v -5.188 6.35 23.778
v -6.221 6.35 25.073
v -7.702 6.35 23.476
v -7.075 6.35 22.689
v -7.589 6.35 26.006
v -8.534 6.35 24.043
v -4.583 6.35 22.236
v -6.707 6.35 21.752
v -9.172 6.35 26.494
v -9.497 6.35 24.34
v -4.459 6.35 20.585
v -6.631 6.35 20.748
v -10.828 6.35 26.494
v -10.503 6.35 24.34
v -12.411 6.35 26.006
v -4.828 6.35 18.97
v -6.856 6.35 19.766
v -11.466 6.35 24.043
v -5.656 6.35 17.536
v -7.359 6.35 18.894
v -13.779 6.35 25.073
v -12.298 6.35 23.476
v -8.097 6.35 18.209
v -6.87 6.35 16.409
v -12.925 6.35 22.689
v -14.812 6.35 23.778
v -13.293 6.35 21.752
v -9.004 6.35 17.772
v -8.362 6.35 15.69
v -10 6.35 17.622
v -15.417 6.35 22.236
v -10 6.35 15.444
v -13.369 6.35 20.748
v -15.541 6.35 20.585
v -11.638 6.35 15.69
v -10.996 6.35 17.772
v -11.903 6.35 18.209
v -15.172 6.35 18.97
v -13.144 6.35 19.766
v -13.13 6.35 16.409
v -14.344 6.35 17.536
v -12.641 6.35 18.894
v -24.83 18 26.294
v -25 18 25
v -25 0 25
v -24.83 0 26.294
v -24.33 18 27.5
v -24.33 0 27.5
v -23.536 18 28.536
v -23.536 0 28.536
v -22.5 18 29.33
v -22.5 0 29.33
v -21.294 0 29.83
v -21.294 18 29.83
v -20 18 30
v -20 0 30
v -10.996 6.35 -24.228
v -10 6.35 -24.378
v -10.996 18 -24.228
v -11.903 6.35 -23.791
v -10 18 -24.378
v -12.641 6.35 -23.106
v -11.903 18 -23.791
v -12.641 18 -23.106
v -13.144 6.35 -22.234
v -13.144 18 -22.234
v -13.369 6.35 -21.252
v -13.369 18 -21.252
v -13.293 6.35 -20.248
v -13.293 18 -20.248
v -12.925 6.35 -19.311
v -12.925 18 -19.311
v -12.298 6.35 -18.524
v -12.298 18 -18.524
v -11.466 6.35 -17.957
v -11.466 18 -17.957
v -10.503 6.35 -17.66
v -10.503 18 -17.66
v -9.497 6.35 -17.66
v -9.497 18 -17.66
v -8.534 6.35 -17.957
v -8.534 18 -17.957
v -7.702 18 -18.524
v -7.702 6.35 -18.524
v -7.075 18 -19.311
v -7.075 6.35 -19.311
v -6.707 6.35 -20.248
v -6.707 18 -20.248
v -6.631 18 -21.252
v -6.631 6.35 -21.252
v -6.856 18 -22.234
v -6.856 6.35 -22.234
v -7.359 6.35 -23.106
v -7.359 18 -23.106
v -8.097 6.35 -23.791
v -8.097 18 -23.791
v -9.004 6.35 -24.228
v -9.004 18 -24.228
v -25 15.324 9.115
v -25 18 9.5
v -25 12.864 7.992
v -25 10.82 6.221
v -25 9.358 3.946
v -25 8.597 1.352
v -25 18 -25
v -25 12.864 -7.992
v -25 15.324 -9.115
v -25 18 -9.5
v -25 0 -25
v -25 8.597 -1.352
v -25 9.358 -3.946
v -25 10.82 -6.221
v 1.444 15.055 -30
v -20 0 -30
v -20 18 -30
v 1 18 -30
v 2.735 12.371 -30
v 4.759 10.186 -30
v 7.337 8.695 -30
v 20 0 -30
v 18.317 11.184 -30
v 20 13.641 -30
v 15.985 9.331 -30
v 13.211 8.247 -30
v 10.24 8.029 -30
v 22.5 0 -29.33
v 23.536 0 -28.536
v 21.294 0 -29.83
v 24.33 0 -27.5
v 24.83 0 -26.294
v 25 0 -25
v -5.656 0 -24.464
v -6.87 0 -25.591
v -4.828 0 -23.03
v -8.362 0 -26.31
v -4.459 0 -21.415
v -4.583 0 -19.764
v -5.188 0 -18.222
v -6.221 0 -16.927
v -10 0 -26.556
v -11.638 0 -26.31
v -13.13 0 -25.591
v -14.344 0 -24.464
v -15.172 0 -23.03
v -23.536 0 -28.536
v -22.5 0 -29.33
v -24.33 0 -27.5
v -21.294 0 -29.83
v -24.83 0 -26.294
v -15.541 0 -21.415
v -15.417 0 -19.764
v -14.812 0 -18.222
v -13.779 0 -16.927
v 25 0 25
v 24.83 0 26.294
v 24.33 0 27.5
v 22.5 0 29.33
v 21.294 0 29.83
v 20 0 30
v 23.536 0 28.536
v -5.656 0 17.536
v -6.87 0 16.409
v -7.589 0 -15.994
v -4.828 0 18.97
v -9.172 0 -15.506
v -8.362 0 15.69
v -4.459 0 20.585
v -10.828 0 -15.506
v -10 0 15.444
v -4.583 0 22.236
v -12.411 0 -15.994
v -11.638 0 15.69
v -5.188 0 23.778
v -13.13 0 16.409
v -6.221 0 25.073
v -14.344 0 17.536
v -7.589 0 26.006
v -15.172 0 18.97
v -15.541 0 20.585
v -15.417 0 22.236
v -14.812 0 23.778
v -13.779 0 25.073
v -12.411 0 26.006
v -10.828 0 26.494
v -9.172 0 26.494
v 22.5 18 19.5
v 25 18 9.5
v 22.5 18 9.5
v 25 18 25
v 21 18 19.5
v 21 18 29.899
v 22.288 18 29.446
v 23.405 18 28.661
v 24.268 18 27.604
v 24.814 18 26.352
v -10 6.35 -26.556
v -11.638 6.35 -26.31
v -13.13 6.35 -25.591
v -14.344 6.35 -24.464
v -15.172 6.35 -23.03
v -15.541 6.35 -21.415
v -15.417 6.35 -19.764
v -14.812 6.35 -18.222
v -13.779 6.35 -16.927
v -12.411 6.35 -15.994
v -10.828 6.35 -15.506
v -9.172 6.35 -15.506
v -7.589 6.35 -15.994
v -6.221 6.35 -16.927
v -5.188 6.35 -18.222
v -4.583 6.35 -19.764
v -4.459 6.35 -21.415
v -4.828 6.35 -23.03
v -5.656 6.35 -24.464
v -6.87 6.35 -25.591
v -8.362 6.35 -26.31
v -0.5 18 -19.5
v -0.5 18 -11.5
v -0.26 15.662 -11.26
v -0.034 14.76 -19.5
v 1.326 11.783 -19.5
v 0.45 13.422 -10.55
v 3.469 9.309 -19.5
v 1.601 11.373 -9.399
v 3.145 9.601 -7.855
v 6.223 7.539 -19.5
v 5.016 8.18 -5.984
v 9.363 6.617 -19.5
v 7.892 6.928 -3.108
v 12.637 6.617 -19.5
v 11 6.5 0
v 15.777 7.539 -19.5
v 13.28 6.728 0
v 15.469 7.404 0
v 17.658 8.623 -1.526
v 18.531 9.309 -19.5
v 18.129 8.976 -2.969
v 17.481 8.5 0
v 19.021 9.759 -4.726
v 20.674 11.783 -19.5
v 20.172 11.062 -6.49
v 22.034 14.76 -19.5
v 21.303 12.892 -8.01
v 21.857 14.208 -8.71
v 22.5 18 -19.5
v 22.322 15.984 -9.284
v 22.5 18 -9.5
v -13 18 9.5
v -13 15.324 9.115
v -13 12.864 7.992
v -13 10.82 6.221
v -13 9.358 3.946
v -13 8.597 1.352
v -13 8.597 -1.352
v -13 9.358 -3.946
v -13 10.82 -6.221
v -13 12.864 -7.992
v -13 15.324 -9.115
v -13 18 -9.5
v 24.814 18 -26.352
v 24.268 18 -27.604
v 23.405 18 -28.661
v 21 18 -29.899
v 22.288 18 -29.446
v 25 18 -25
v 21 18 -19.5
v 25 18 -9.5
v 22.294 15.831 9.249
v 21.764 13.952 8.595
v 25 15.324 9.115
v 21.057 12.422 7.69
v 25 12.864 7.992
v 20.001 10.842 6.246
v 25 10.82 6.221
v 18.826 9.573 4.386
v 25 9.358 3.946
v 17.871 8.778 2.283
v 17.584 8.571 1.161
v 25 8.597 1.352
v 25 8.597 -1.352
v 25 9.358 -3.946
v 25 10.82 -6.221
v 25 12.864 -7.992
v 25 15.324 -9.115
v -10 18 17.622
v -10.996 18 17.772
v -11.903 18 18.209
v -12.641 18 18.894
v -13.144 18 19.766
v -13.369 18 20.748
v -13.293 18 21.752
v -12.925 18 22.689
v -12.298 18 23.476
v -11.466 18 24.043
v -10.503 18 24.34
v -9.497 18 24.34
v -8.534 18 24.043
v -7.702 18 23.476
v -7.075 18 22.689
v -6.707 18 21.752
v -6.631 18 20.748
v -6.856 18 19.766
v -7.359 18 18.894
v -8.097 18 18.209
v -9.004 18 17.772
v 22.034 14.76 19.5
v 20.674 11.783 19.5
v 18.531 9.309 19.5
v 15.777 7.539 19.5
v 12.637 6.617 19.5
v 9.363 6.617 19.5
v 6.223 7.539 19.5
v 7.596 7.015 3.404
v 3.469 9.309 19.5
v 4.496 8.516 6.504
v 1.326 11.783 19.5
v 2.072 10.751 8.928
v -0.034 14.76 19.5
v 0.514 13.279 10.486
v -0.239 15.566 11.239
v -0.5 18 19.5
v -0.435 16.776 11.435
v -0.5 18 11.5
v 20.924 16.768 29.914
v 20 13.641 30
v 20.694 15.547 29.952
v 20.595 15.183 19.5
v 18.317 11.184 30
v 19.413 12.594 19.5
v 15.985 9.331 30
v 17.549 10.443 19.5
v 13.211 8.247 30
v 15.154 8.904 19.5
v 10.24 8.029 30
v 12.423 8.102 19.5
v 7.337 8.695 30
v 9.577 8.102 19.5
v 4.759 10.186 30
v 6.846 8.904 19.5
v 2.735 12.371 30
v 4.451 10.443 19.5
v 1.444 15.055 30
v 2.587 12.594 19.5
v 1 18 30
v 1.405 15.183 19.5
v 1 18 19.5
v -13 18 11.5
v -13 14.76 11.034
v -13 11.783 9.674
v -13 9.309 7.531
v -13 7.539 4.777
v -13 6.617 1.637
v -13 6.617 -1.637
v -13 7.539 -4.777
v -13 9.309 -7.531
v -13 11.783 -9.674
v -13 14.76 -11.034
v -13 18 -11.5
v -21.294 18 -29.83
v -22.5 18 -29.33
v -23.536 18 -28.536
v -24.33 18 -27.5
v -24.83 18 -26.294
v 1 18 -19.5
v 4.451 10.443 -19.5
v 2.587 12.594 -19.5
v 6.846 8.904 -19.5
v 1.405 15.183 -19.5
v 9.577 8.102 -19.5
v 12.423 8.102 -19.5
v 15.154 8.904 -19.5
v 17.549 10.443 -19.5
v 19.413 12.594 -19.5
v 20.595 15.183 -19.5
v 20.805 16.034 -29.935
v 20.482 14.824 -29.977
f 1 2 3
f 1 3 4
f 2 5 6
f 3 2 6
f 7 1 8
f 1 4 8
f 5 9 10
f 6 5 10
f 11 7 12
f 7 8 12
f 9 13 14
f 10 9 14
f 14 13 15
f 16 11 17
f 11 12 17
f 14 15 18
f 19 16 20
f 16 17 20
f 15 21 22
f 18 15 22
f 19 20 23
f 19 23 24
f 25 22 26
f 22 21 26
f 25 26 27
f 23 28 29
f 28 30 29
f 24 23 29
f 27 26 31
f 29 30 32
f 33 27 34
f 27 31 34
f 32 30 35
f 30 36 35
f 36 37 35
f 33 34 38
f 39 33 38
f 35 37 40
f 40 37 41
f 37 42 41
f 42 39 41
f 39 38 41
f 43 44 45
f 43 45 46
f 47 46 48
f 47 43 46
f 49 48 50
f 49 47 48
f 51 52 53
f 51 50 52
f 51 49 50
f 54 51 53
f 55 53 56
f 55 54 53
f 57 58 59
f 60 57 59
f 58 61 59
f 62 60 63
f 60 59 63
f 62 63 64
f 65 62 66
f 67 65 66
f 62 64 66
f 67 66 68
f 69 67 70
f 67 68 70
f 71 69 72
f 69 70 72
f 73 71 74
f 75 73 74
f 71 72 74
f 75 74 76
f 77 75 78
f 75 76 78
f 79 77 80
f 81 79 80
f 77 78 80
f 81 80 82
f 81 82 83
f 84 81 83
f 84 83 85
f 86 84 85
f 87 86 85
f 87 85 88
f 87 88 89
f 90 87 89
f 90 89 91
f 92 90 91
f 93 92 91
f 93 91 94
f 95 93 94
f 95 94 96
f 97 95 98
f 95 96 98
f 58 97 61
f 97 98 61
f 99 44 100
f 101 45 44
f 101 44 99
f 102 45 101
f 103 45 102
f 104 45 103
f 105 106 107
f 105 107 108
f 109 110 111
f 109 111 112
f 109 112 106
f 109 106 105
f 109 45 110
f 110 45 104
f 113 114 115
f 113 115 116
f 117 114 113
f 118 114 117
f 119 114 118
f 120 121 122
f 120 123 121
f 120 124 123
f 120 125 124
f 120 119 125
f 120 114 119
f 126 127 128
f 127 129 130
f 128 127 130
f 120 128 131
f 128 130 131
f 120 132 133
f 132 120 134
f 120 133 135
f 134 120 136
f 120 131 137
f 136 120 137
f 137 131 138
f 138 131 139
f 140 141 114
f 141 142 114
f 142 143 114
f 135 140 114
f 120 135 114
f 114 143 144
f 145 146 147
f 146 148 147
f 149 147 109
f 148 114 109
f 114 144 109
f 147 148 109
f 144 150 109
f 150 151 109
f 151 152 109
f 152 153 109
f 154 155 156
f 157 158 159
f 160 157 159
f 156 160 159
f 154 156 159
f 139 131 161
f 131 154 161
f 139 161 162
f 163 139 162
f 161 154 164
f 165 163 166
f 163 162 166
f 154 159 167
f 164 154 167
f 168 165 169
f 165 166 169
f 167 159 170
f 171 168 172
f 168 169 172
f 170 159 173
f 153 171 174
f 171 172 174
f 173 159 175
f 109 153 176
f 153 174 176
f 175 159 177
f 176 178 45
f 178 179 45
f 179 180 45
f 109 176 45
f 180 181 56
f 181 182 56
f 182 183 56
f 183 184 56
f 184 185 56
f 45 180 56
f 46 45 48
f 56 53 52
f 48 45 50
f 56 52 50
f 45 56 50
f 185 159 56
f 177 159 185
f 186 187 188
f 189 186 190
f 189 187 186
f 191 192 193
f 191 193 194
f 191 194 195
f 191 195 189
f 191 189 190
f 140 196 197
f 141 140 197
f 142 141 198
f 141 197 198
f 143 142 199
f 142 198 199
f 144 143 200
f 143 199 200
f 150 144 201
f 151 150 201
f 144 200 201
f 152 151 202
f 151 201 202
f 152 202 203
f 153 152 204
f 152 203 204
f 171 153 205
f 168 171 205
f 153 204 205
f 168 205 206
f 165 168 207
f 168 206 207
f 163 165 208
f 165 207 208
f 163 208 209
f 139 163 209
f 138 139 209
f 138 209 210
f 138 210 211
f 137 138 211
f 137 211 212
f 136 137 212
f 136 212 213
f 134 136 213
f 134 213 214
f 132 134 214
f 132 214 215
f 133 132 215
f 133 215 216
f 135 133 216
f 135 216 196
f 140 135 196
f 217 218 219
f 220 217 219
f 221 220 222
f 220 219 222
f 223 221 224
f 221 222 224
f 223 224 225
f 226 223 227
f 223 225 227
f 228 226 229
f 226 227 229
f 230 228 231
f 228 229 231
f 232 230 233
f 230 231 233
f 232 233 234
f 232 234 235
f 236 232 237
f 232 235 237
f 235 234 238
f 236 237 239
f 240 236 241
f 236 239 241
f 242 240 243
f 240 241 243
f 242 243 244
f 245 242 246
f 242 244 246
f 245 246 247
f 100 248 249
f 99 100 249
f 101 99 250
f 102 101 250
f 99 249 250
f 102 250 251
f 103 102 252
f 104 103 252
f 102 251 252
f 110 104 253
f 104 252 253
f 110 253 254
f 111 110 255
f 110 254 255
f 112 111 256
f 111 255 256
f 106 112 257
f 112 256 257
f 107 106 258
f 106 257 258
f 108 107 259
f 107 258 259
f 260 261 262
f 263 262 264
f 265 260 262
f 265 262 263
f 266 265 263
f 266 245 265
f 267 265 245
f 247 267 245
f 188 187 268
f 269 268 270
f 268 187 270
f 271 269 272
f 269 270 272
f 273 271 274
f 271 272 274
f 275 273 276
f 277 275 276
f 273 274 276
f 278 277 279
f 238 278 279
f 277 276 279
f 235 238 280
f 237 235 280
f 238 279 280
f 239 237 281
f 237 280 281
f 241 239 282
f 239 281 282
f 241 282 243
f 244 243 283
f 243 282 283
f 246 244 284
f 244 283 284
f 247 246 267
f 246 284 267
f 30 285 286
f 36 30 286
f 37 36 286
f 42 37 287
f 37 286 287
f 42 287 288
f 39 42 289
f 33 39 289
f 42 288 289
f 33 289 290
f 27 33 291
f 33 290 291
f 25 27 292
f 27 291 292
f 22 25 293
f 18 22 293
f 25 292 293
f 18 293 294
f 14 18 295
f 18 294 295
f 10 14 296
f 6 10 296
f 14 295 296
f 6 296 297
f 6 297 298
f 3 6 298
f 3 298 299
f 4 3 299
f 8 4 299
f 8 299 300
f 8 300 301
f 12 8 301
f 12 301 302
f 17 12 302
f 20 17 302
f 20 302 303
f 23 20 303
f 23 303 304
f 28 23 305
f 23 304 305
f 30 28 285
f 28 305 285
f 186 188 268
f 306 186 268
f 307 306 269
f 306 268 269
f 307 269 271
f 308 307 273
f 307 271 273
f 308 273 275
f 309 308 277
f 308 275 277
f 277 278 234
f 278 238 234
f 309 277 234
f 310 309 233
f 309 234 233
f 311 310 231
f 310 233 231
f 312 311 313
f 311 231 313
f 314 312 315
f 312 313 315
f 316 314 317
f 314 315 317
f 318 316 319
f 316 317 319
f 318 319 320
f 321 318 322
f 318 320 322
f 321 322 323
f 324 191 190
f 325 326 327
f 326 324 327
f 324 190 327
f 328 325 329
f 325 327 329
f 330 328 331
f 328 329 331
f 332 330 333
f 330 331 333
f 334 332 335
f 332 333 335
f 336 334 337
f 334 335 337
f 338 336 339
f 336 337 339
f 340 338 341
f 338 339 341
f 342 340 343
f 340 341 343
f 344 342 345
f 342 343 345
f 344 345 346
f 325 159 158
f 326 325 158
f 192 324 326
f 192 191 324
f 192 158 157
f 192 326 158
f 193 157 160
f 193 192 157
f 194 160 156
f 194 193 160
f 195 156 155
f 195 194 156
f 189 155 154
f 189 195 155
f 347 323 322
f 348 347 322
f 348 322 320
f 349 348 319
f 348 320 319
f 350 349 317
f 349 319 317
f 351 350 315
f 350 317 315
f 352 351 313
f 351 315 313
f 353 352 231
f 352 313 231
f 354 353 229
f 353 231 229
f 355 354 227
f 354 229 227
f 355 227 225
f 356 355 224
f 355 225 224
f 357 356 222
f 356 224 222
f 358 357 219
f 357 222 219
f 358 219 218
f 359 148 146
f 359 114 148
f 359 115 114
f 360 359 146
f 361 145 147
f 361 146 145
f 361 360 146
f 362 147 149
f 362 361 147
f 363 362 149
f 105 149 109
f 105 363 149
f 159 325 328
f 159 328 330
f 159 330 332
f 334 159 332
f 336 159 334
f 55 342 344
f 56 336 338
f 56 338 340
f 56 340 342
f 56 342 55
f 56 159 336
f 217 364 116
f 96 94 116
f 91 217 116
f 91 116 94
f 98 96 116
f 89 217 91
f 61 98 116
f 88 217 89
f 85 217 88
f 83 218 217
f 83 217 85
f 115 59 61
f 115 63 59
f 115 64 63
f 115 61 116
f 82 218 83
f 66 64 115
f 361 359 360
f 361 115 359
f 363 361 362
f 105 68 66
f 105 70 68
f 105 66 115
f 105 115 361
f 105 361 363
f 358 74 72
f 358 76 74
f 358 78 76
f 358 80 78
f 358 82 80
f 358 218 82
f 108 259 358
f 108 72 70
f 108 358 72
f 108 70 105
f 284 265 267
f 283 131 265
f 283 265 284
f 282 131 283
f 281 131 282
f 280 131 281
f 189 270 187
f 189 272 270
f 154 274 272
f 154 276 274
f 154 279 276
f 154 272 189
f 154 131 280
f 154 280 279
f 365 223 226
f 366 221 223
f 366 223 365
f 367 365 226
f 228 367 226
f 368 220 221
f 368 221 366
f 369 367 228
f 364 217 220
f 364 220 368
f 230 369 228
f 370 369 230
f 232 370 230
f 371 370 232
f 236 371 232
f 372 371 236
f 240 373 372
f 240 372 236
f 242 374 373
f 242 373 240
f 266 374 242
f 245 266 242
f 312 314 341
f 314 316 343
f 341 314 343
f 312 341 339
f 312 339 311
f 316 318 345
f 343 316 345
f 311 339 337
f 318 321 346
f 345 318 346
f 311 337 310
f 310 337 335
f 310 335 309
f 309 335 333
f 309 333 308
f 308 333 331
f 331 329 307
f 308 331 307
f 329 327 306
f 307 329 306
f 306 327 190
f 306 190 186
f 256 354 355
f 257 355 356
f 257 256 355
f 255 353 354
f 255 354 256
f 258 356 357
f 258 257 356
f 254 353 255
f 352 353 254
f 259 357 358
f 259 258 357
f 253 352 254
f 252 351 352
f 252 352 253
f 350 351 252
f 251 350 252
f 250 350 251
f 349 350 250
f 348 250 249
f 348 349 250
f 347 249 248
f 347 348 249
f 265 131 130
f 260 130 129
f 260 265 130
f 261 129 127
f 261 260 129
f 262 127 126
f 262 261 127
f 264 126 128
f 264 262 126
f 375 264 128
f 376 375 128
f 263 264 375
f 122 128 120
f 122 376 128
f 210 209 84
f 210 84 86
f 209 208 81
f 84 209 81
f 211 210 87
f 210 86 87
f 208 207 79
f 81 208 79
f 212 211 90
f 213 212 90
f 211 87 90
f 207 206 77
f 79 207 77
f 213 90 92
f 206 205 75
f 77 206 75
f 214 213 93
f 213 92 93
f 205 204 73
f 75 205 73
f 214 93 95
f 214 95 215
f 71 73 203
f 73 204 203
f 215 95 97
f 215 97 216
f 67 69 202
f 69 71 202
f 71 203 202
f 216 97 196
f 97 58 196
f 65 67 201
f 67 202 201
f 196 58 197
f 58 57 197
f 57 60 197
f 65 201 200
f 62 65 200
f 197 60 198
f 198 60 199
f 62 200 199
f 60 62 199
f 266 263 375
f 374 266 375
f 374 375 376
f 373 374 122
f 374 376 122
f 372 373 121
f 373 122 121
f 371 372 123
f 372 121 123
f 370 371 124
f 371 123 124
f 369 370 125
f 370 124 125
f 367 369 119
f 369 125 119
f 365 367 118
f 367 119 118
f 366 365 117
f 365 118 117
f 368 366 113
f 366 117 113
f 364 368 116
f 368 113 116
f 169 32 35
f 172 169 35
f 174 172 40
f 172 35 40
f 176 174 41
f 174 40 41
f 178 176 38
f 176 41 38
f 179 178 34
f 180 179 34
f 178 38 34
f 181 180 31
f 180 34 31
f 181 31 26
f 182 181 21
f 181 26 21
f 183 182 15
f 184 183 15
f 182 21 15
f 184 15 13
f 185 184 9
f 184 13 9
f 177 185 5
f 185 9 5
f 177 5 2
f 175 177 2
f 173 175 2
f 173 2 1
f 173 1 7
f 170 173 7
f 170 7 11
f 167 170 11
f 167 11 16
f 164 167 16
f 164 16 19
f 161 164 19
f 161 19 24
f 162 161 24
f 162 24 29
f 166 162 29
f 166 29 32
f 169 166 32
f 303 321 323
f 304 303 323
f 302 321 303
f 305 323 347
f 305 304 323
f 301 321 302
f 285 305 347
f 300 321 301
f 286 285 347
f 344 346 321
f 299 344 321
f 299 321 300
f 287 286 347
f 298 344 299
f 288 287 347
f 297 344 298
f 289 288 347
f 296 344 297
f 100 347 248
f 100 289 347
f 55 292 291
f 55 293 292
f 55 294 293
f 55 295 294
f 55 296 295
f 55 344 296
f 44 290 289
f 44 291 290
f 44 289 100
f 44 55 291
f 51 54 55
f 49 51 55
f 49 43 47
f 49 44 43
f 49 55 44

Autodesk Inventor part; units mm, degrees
ref_plane "XZ Plane" through (0, 0, 0) normal (0, 1, 0) x (-1, 0, 0)
ref_plane "XY Plane" through (0, 0, 0) normal (0, 0, 1) x (1, 0, 0)
sketch "Sketch1" plane through (0, 0, 0) normal (0, 1, 0) x (-1, 0, 0)
  line L0 (-25, 30) -> (25, 30)
  line L1 (25, 30) -> (25, -30)
  line L2 (25, -30) -> (-25, -30)
  line L3 (-25, -30) -> (-25, 30)
  line L4 (-25, 30) -> (25, -30) construction
  line L5 (25, 30) -> (-25, -30) construction
  point P0 (0, 0)
  dimension "d0" = 50
  dimension "d1" = 60
extrude "Extrusion1" add sketch "Sketch1" along normal blind 18
sketch "Sketch2" plane through (25, 0, 30) normal (1, 0, 0) x (0, 0, -1)
  line L0 (60, 18) -> (0, 18) projected
  circle A0 centre (30, 18) radius 9.5
  point P0 (30, 0)
  point P1 (20.5, 18)
  point P2 (39.5, 18)
  dimension "d4" = 19
extrude "Extrusion2" cut sketch "Sketch2" against normal through all contours A0 L0 picked at (28.8771, 15.0391)
sketch "Sketch3" plane through (25, 0, -30) normal (0, 0, -1) x (-1, 0, 0)
  line L0 (0, 18) -> (50, 18) projected
  circle A0 centre (14, 18) radius 10
  point P0 (25, 0)
  point P1 (24, 18)
  point P2 (4, 18)
  dimension "d7" = 20
  dimension "d8" = 14
extrude "Extrusion3" cut sketch "Sketch3" against normal through all contours L0 A0 picked at (12.1065, 15.2567)
sketch "Sketch4" plane through (0, 0, 0) normal (0, 0, 1) x (1, 0, 0)
  arc A0 (1, 18) -> (21, 18) centre (11, 18) ccw projected
  circle A1 centre (11, 18) radius 11.5
  point P0 (0, 0)
  dimension "d11" = 23
extrude "Extrusion4" cut sketch "Sketch4" along normal mid plane 39
ref_plane "Work Plane2" through (11, 18, -30) normal (1, 0, 0) x (0, 1, 0)
sketch "Sketch5" plane through (11, 18, -30) normal (1, 0, 0) x (0, 1, 0)
  arc A0 (0, 39.5) -> (0, 20.5) centre (0, 30) ccw projected
  circle A1 centre (0, 30) radius 11.5
  point P0 (-18, 30)
  dimension "d14" = 23
extrude "Extrusion5" cut sketch "Sketch5" against normal blind 24
sketch "Sketch7" plane through (0, 0, 0) normal (0, -1, 0) x (1, 0, 0)
  line L0 (25, -30) -> (-25, -30) projected
  line L1 (-25, 30) -> (25, 30) projected
  line L2 (-25, -30) -> (-25, 30) projected
  point P0 (0, 0)
  point P1 (-10, -21)
  point P2 (-10, 21)
  dimension "d28" = 9
  dimension "d29" = 9
  dimension "d30" = 15
hole "Hole2" at (-10, 0, -21) at (-10, 0, 21) direction (0, 1, 0) diameter 6.756 end through all counterbore diameter 11.113 counterbore depth 6.35 clearance for "Socket Head Cap Screw" size "1/4" standard "Ansi Unified Screw Threads"
fillet "Fillet1" radius 5 4 edges at (-25, 9, -30) (-25, 9, 30) (25, 9, 30) (25, 9, -30)
equation "\"d28\" = d29"
properties part number "Valve Block Bottom"
